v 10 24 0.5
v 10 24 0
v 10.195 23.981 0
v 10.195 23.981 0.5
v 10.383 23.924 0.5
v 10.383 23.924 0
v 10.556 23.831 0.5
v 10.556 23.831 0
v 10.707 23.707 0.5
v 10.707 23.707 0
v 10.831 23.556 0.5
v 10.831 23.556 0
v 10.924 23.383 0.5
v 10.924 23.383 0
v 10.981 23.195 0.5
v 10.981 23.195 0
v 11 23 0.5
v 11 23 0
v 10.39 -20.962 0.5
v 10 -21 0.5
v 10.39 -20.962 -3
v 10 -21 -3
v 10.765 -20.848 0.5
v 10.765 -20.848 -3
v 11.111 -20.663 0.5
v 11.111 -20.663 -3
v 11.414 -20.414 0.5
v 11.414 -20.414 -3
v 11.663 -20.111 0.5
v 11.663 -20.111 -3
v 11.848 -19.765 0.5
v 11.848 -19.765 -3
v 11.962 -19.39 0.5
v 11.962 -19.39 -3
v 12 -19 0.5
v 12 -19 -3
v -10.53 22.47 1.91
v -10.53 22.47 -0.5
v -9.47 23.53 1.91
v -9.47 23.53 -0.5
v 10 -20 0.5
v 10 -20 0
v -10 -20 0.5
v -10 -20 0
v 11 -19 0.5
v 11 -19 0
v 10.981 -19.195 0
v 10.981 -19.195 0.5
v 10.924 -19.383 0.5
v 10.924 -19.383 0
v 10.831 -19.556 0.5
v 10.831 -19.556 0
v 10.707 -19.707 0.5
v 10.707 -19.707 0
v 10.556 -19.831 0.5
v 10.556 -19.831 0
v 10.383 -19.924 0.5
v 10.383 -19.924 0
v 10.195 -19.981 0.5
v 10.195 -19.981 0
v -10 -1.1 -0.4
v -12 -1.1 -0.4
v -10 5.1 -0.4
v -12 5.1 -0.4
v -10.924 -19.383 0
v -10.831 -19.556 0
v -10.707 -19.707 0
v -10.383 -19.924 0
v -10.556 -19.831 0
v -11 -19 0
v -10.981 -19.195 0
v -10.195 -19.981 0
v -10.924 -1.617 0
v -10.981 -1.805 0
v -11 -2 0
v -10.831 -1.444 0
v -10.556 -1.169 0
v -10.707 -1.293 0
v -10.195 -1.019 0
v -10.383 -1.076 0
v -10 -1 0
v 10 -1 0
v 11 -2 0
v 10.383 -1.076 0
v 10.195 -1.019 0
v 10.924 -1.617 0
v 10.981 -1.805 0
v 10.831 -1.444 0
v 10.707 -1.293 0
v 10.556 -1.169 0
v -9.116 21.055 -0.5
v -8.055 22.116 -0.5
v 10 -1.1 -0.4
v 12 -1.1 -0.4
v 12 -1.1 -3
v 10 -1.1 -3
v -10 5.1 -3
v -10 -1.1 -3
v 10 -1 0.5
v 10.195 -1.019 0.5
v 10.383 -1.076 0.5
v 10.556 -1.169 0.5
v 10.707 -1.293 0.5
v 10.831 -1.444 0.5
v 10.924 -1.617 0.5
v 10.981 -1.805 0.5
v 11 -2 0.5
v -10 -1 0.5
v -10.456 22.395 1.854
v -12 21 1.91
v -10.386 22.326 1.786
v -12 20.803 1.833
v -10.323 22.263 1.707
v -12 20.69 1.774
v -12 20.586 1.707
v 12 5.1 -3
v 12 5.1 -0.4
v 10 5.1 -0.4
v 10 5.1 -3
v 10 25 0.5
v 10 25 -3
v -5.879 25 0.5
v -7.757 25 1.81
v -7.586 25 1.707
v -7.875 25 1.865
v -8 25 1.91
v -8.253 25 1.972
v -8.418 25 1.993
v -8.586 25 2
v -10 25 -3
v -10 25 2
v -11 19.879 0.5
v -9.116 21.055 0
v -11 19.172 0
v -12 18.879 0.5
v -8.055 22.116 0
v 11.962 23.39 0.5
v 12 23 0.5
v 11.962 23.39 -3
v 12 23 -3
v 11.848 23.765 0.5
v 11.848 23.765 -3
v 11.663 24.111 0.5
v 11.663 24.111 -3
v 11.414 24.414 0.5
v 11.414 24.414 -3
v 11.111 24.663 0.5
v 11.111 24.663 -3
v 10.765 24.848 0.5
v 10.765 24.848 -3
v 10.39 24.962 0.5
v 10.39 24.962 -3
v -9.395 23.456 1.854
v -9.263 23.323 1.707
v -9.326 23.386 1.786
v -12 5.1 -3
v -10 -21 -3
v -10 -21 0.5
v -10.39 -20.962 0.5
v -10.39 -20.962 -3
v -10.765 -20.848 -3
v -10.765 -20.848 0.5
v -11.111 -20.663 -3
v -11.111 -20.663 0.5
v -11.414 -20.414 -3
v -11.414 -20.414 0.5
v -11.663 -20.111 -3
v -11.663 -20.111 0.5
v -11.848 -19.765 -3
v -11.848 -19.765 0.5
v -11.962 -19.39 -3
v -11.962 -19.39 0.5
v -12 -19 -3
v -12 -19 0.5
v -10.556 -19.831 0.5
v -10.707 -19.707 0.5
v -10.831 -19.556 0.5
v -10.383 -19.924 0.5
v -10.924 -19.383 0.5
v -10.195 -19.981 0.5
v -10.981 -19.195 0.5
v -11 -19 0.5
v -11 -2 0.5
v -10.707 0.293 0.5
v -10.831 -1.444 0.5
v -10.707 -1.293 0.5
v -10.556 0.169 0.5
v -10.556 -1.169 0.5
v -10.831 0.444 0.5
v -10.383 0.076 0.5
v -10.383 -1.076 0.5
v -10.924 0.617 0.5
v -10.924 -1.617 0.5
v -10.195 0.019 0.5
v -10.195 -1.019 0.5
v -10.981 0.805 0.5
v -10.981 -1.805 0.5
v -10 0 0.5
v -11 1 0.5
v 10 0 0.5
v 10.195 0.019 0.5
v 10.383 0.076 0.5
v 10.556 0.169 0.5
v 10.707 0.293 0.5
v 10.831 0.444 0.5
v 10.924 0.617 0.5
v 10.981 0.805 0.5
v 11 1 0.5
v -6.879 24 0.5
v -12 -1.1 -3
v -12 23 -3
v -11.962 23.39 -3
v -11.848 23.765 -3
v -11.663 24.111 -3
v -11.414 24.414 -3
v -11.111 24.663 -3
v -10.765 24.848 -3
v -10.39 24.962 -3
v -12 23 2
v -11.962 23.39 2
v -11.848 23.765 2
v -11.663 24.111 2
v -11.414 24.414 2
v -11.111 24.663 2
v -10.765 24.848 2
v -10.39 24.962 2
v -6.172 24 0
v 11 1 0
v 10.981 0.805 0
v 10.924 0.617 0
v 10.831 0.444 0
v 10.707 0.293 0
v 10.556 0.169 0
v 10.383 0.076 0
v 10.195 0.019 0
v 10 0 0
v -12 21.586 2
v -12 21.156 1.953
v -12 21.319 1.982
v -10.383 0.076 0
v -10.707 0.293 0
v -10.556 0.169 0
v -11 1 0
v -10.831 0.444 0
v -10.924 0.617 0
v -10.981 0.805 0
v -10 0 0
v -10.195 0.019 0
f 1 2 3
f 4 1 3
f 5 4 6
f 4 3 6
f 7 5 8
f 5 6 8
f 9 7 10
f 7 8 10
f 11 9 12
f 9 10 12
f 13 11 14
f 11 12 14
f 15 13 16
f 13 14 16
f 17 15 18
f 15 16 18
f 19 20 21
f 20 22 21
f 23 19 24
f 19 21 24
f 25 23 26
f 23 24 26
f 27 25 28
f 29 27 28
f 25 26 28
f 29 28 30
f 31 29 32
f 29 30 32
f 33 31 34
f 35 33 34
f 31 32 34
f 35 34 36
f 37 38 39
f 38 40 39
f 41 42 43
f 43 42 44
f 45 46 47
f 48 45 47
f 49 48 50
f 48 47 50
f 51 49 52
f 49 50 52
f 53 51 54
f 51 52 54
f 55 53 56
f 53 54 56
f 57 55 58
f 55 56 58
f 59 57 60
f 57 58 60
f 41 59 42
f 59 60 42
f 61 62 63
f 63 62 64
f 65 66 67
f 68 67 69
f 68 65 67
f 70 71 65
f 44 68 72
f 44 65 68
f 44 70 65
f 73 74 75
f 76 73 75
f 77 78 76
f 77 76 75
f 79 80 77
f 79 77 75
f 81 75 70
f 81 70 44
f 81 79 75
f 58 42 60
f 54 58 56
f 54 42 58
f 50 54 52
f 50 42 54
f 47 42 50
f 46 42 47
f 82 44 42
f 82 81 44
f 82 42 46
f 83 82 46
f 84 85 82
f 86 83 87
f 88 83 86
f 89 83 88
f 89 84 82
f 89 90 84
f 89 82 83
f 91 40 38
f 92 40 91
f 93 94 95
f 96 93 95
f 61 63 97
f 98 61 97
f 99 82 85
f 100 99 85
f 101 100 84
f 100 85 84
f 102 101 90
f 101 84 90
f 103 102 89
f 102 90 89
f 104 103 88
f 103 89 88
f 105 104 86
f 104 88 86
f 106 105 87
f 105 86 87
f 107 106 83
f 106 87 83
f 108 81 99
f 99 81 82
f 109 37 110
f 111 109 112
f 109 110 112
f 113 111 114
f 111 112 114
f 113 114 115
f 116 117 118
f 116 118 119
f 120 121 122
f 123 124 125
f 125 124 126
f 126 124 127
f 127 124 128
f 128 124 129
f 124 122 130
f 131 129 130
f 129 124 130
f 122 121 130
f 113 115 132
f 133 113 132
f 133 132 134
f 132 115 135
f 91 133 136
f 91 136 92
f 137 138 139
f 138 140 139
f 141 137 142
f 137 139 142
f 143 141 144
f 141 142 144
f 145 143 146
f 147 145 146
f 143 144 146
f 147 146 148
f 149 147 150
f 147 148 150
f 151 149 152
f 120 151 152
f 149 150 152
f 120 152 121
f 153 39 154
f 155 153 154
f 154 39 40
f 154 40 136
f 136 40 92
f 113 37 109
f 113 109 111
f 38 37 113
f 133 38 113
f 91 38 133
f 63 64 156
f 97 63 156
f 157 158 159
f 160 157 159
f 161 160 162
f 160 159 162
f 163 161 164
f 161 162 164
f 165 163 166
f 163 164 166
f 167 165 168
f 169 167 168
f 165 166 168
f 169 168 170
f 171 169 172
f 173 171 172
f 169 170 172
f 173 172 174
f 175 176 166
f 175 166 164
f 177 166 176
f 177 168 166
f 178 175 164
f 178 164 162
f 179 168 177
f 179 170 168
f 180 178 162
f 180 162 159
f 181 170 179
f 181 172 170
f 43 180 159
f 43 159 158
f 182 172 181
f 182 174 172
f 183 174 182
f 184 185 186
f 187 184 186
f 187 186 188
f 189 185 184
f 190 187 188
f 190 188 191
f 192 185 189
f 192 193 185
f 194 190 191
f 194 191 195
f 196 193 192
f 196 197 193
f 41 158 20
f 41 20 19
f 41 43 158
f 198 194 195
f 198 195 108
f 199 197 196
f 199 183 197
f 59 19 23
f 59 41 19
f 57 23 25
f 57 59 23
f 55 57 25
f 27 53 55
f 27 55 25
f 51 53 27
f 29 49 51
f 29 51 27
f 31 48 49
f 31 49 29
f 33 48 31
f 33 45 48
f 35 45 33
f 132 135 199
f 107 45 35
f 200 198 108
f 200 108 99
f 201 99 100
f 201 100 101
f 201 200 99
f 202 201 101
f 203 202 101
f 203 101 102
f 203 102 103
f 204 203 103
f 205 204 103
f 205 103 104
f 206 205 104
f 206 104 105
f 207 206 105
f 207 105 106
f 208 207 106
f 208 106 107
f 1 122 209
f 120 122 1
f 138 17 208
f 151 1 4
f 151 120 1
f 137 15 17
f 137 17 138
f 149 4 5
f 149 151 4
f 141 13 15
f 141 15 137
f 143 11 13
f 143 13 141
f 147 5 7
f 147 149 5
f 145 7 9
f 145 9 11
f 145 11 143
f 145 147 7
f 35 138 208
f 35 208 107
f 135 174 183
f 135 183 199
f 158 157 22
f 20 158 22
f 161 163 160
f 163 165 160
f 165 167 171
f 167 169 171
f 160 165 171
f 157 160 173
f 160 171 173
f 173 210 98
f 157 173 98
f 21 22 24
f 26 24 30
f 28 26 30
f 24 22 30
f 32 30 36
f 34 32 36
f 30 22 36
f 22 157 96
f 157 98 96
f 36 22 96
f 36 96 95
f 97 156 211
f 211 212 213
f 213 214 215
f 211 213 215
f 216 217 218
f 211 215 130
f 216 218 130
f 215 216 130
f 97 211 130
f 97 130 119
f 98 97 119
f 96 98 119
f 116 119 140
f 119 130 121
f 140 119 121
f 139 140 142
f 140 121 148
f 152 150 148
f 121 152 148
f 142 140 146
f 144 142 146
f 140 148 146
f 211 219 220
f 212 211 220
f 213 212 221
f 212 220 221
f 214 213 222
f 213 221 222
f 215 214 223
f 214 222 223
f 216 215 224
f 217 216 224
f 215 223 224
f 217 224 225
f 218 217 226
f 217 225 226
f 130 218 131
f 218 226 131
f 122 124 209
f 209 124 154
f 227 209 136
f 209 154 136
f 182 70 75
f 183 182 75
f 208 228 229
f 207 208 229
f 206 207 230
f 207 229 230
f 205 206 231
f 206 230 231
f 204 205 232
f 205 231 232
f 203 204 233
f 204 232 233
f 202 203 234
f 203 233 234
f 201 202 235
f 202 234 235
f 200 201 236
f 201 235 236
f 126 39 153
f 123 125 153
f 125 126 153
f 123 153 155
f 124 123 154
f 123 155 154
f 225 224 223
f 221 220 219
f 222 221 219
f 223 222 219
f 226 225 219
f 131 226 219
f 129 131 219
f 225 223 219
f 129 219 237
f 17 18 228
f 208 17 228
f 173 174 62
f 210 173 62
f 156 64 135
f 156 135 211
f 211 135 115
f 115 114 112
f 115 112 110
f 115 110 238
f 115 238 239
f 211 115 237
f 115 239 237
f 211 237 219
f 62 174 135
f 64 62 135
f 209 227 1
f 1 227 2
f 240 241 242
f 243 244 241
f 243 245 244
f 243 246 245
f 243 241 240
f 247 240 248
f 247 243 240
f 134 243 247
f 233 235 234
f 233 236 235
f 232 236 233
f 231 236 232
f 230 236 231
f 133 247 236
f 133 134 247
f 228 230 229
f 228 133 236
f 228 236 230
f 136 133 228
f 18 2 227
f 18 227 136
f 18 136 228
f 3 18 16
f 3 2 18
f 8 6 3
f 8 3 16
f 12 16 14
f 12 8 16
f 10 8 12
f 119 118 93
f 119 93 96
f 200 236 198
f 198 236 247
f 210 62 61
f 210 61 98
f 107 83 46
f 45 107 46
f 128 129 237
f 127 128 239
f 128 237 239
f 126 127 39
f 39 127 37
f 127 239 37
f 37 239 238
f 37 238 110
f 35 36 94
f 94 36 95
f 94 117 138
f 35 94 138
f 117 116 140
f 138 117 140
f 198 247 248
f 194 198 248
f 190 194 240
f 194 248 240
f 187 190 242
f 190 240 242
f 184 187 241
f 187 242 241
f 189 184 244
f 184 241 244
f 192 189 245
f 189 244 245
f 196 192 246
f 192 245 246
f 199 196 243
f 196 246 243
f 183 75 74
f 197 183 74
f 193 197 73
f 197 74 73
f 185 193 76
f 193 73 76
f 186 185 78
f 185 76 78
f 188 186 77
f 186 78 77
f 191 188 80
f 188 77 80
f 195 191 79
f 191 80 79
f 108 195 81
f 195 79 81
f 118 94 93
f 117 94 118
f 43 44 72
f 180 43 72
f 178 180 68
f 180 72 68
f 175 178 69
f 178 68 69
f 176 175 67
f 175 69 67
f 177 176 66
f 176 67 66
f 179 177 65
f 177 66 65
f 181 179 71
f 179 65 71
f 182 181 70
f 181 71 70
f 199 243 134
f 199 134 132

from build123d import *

# Parameters (mm, degrees)
BASE_DEPTH                = 3
CORNER_MARK_DEPTH         = 4.5
CORNER_MARK_DEPTH_BACK    = 4.5
CORNER_SKETCH_3_W         = 2
CORNER_SKETCH_3_H         = 0.5
CORNER_MARK_CUTOUT_DEPTH  = 0.75
CORNER_FIT_CUT_DEPTH      = 32.616432581
CORNER_FIT_CUT_DEPTH_BACK = 32.616432581
BORDER_START              = -3
BORDER_DEPTH              = 3.5
BODY_MIRROR_START         = -3
BODY_MIRROR_DEPTH         = 3
BODY_MIRROR_2_DEPTH       = 0.5
MAGNET_CUTOUT_SKETCH_W    = 2.6
MAGNET_CUTOUT_SKETCH_H    = 6.2
MAGNET_CUTOUT_DEPTH       = 2


with BuildPart() as part:
    # base_sketch → base (new body)
    with BuildSketch(Plane.XY):
        with BuildLine():
            ThreePointArc((-10, 0), (-10.707106781, 0.292893219), (-11, 1))
            Line((-11, 1), (-11, 23))
            ThreePointArc((-11, 23), (-10.707106781, 23.707106781), (-10, 24))
            Line((-10, 24), (0, 24))
            Line((0, 24), (0, 0))
            Line((0, 0), (-10, 0))
        make_face()
        with BuildLine():
            Line((0, -1), (-10, -1))
            ThreePointArc((-10, -1), (-10.707106781, -1.292893219), (-11, -2))
            Line((-11, -2), (-11, -19))
            ThreePointArc((-11, -19), (-10.707106781, -19.707106781), (-10, -20))
            Line((-10, -20), (0, -20))
            Line((0, -20), (0, -1))
        make_face()
        with BuildLine():
            Line((-10, 0), (0, 0))
            Line((0, 0), (0, -1))
            Line((0, -1), (-10, -1))
            ThreePointArc((-10, -1), (-10.707106781, -1.292893219), (-11, -2))
            Line((-11, -2), (-11, -19))
            ThreePointArc((-11, -19), (-10.707106781, -19.707106781), (-10, -20))
            Line((-10, -20), (0, -20))
            Line((0, -20), (0, -21))
            Line((0, -21), (-10, -21))
            ThreePointArc((-10, -21), (-11.414213562, -20.414213562), (-12, -19))
            Line((-12, -19), (-12, 23))
            ThreePointArc((-12, 23), (-11.414213562, 24.414213562), (-10, 25))
            Line((-10, 25), (0, 25))
            Line((0, 25), (0, 24))
            Line((0, 24), (-10, 24))
            ThreePointArc((-10, 24), (-10.707106781, 23.707106781), (-11, 23))
            Line((-11, 23), (-11, 1))
            ThreePointArc((-11, 1), (-10.707106781, 0.292893219), (-10, 0))
        make_face()
    extrude(amount=-BASE_DEPTH)

    # corner_sketch → corner_mark (add, two sides: drawn at the far end of the back side and taken through both)
    with BuildSketch(Plane(origin=(6.5, 6.5, 0), x_dir=(0.7071067811865477, -0.7071067811865475, 0), z_dir=(0.7071067811865475, 0.7071067811865477, 0)).offset(-CORNER_MARK_DEPTH_BACK)):
        with BuildLine():
            Line((-23.334523779, 0), (-25.334523779, 0))
            Line((-25.334523779, 0), (-25.334523779, -2))
            Line((-25.334523779, -2), (-23.748737342, -2))
            ThreePointArc((-23.748737342, -2), (-23.536817216, -1.97728699), (-23.334523779, -1.910179721))
            Line((-23.334523779, -1.910179721), (-23.334523779, 0))
        make_face()
        with BuildLine():
            Line((-21.334523779, 0), (-23.334523779, 0))
            Line((-23.334523779, 0), (-23.334523779, -1.910179721))
            ThreePointArc((-23.334523779, -1.910179721), (-23.178957136, -1.821797126), (-23.04163056, -1.707106781))
            Line((-23.04163056, -1.707106781), (-21.334523779, 0))
        make_face()
    extrude(amount=CORNER_MARK_DEPTH + CORNER_MARK_DEPTH_BACK)

    # corner_sketch<3> → corner_mark_cutout (cut, symmetric)
    with BuildSketch(Plane(origin=(6.5, 6.5, 0), x_dir=(0.7071067811865477, -0.7071067811865475, 0), z_dir=(0.7071067811865475, 0.7071067811865477, 0))):
        with BuildLine():
            Line((-21.334523779, 0), (-23.334523779, 0))
            Line((-23.334523779, 0), (-23.334523779, -1.910179721))
            ThreePointArc((-23.334523779, -1.910179721), (-23.178957136, -1.821797126), (-23.04163056, -1.707106781))
            Line((-23.04163056, -1.707106781), (-21.334523779, 0))
        make_face()
        with Locations((-22.334523779, 0.25)):
            Rectangle(CORNER_SKETCH_3_W, CORNER_SKETCH_3_H)
    extrude(amount=CORNER_MARK_CUTOUT_DEPTH, both=True, mode=Mode.SUBTRACT)

    # Эскиз3 → corner_fit_cut (cut, two sides: drawn at the far end of the back side and taken through both)
    with BuildSketch(Plane(origin=(0, 0, -3), x_dir=(-1, 0, 0), z_dir=(0, 0, -1)).offset(-CORNER_FIT_CUT_DEPTH_BACK)):
        with BuildLine():
            Line((10, 25), (4.949214827, 25))
            Line((4.949214827, 25), (4.949214827, 29.369186308))
            Line((4.949214827, 29.369186308), (15.830436382, 29.369186308))
            Line((15.830436382, 29.369186308), (15.830436382, 18.313069579))
            Line((15.830436382, 18.313069579), (12, 18.313069579))
            Line((12, 18.313069579), (12, 23))
            ThreePointArc((12, 23), (11.414213562, 24.414213562), (10, 25))
        make_face()
    extrude(amount=CORNER_FIT_CUT_DEPTH + CORNER_FIT_CUT_DEPTH_BACK, mode=Mode.SUBTRACT)

    # border: read off the stored shape, not the designer's step
    # border outline → border (add)
    with BuildSketch(Plane.XY.offset(BORDER_START)):
        Polygon((0, 24), (0, 25), (-5.878679656, 25), (-6.878679656, 24), align=None)
        with BuildLine():
            ThreePointArc((-10, 0), (-10.707106781, 0.292893219), (-11, 1))
            Line((-11, 1), (-11, 19.878679656))
            Line((-11, 19.878679656), (-12, 18.878679656))
            Line((-12, 18.878679656), (-12, -19))
            ThreePointArc((-12, -19), (-11.414213562, -20.414213562), (-10, -21))
            Line((-10, -21), (0, -21))
            Line((0, -21), (0, -20))
            Line((0, -20), (-10, -20))
            ThreePointArc((-10, -20), (-10.707106781, -19.707106781), (-11, -19))
            Line((-11, -19), (-11, -2))
            ThreePointArc((-11, -2), (-10.707106781, -1.292893219), (-10, -1))
            Line((-10, -1), (0, -1))
            Line((0, -1), (0, 0))
            Line((0, 0), (-10, 0))
        make_face()
    extrude(amount=BORDER_DEPTH)

    # body_mirror: read off the stored shape, not the designer's step
    # body_mirror outline → body_mirror (add)
    with BuildSketch(Plane.XY.offset(BODY_MIRROR_START)):
        with BuildLine():
            Line((0, -21), (10, -21))
            ThreePointArc((10, -21), (11.414213562, -20.414213562), (12, -19))
            Line((12, -19), (12, 23))
            ThreePointArc((12, 23), (11.414213562, 24.414213562), (10, 25))
            Line((10, 25), (0, 25))
            Line((0, 25), (0, -21))
        make_face()
    extrude(amount=BODY_MIRROR_DEPTH)

    # body_mirror 2 outline → body_mirror 2 (add)
    with BuildSketch(Plane.XY):
        with BuildLine():
            Line((0, -20), (0, -21))
            Line((0, -21), (10, -21))
            ThreePointArc((10, -21), (11.414213562, -20.414213562), (12, -19))
            Line((12, -19), (12, 23))
            ThreePointArc((12, 23), (11.414213562, 24.414213562), (10, 25))
            Line((10, 25), (0, 25))
            Line((0, 25), (0, 24))
            Line((0, 24), (10, 24))
            ThreePointArc((10, 24), (10.707106781, 23.707106781), (11, 23))
            Line((11, 23), (11, 1))
            ThreePointArc((11, 1), (10.707106781, 0.292893219), (10, 0))
            Line((10, 0), (0, 0))
            Line((0, 0), (0, -1))
            Line((0, -1), (10, -1))
            ThreePointArc((10, -1), (10.707106781, -1.292893219), (11, -2))
            Line((11, -2), (11, -19))
            ThreePointArc((11, -19), (10.707106781, -19.707106781), (10, -20))
            Line((10, -20), (0, -20))
        make_face()
    extrude(amount=BODY_MIRROR_2_DEPTH)

    # magnet_cutout_sketch → magnet_cutout (cut)
    with BuildSketch(Plane(origin=(12, 0, 0), x_dir=(0, 0, -1), z_dir=(1, 0, 0))):
        with Locations((1.7, 2)):
            Rectangle(MAGNET_CUTOUT_SKETCH_W, MAGNET_CUTOUT_SKETCH_H)
    magnet_cutout = extrude(amount=-MAGNET_CUTOUT_DEPTH, mode=Mode.SUBTRACT)

    # magnet_cutout_mirror: magnet_cutout across plane
    add(magnet_cutout.mirror(Plane(origin=(0, 0, 0), x_dir=(0, 0, 1), z_dir=(1, 0, 0))), mode=Mode.SUBTRACT)


solid = part.part
